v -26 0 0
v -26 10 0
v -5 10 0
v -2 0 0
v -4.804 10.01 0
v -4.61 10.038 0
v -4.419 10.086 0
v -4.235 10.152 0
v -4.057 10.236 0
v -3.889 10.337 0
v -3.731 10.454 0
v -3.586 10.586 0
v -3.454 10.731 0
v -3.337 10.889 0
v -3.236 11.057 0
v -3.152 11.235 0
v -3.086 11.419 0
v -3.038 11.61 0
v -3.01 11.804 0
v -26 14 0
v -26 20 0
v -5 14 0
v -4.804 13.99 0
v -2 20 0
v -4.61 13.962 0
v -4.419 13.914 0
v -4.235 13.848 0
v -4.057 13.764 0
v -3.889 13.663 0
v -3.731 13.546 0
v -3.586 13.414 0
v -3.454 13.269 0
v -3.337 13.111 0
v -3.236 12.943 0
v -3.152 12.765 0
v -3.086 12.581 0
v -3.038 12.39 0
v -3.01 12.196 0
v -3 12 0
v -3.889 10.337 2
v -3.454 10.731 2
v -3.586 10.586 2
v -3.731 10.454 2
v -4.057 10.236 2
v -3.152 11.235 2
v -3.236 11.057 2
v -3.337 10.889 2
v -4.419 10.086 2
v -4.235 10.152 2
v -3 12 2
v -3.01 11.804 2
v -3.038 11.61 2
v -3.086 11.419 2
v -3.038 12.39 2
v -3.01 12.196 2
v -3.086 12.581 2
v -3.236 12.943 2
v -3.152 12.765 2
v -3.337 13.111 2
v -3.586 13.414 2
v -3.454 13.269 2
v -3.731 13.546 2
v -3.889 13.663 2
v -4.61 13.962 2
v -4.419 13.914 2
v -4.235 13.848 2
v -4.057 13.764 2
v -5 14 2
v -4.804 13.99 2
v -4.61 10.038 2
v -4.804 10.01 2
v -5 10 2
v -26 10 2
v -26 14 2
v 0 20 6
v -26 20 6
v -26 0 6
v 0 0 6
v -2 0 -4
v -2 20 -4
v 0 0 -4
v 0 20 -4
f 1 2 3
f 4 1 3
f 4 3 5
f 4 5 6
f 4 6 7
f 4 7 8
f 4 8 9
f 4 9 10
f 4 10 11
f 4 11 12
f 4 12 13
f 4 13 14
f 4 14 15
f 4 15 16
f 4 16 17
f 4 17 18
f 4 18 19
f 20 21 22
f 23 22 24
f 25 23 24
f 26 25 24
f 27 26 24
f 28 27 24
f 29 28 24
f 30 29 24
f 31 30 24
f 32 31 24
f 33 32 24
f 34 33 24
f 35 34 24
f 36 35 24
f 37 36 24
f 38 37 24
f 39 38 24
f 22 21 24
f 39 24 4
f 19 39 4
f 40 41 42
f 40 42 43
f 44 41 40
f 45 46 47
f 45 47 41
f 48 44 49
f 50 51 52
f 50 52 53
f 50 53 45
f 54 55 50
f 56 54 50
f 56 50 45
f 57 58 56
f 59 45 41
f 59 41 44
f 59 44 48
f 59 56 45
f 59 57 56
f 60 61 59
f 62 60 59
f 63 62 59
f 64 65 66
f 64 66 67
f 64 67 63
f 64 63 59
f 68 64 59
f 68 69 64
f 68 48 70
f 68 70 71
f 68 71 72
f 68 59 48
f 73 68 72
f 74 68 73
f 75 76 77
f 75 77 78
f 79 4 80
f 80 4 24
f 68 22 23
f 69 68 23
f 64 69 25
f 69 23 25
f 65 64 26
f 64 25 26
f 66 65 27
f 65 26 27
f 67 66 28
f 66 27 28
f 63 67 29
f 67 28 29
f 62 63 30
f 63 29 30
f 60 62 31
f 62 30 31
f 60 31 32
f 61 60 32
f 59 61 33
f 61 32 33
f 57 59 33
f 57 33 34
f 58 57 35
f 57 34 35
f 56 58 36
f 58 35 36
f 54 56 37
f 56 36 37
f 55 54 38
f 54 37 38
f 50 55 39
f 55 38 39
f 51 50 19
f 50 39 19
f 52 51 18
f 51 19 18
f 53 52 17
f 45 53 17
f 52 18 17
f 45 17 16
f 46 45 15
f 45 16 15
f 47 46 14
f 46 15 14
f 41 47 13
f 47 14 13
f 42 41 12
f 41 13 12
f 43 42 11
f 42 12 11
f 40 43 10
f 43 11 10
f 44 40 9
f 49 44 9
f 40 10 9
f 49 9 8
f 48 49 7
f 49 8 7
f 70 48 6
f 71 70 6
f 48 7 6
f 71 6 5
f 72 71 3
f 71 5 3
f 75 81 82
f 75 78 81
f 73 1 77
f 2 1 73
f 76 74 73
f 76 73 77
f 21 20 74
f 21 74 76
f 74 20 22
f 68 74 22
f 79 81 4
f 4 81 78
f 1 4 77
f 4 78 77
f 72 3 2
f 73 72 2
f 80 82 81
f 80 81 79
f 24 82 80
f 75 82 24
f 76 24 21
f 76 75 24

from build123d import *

# Parameters (mm, degrees)
ESBO_O1_W                = 26
ESBO_O1_H                = 20
RESSALTO_EXTRUS_O1_DEPTH = 6
ESBO_O2_W                = 2
ESBO_O2_H                = 20
RESSALTO_EXTRUS_O2_DEPTH = 4
CORTE_EXTRUS_O1_DEPTH    = 2


with BuildPart() as part:
    # Esboço1 → Ressalto-extrusão1 (new body)
    with BuildSketch(Plane.XY):
        with Locations((-13, 10)):
            Rectangle(ESBO_O1_W, ESBO_O1_H)
    extrude(amount=RESSALTO_EXTRUS_O1_DEPTH)

    # Esboço2 → Ressalto-extrusão2 (add)
    with BuildSketch(Plane(origin=(0, 0, 0), x_dir=(-1, 0, 0), z_dir=(0, 0, -1))):
        with Locations((1, 10)):
            Rectangle(ESBO_O2_W, ESBO_O2_H)
    extrude(amount=RESSALTO_EXTRUS_O2_DEPTH)

    # Esboço3 → Corte-extrusão1 (cut)
    with BuildSketch(Plane(origin=(0, 0, 0), x_dir=(-1, 0, 0), z_dir=(0, 0, -1))):
        with BuildLine():
            Line((5, 10), (26, 10))
            Line((26, 10), (26, 14))
            Line((26, 14), (5, 14))
            ThreePointArc((5, 14), (3, 12), (5, 10))
        make_face()
    extrude(amount=-CORTE_EXTRUS_O1_DEPTH, mode=Mode.SUBTRACT)


solid = part.part
